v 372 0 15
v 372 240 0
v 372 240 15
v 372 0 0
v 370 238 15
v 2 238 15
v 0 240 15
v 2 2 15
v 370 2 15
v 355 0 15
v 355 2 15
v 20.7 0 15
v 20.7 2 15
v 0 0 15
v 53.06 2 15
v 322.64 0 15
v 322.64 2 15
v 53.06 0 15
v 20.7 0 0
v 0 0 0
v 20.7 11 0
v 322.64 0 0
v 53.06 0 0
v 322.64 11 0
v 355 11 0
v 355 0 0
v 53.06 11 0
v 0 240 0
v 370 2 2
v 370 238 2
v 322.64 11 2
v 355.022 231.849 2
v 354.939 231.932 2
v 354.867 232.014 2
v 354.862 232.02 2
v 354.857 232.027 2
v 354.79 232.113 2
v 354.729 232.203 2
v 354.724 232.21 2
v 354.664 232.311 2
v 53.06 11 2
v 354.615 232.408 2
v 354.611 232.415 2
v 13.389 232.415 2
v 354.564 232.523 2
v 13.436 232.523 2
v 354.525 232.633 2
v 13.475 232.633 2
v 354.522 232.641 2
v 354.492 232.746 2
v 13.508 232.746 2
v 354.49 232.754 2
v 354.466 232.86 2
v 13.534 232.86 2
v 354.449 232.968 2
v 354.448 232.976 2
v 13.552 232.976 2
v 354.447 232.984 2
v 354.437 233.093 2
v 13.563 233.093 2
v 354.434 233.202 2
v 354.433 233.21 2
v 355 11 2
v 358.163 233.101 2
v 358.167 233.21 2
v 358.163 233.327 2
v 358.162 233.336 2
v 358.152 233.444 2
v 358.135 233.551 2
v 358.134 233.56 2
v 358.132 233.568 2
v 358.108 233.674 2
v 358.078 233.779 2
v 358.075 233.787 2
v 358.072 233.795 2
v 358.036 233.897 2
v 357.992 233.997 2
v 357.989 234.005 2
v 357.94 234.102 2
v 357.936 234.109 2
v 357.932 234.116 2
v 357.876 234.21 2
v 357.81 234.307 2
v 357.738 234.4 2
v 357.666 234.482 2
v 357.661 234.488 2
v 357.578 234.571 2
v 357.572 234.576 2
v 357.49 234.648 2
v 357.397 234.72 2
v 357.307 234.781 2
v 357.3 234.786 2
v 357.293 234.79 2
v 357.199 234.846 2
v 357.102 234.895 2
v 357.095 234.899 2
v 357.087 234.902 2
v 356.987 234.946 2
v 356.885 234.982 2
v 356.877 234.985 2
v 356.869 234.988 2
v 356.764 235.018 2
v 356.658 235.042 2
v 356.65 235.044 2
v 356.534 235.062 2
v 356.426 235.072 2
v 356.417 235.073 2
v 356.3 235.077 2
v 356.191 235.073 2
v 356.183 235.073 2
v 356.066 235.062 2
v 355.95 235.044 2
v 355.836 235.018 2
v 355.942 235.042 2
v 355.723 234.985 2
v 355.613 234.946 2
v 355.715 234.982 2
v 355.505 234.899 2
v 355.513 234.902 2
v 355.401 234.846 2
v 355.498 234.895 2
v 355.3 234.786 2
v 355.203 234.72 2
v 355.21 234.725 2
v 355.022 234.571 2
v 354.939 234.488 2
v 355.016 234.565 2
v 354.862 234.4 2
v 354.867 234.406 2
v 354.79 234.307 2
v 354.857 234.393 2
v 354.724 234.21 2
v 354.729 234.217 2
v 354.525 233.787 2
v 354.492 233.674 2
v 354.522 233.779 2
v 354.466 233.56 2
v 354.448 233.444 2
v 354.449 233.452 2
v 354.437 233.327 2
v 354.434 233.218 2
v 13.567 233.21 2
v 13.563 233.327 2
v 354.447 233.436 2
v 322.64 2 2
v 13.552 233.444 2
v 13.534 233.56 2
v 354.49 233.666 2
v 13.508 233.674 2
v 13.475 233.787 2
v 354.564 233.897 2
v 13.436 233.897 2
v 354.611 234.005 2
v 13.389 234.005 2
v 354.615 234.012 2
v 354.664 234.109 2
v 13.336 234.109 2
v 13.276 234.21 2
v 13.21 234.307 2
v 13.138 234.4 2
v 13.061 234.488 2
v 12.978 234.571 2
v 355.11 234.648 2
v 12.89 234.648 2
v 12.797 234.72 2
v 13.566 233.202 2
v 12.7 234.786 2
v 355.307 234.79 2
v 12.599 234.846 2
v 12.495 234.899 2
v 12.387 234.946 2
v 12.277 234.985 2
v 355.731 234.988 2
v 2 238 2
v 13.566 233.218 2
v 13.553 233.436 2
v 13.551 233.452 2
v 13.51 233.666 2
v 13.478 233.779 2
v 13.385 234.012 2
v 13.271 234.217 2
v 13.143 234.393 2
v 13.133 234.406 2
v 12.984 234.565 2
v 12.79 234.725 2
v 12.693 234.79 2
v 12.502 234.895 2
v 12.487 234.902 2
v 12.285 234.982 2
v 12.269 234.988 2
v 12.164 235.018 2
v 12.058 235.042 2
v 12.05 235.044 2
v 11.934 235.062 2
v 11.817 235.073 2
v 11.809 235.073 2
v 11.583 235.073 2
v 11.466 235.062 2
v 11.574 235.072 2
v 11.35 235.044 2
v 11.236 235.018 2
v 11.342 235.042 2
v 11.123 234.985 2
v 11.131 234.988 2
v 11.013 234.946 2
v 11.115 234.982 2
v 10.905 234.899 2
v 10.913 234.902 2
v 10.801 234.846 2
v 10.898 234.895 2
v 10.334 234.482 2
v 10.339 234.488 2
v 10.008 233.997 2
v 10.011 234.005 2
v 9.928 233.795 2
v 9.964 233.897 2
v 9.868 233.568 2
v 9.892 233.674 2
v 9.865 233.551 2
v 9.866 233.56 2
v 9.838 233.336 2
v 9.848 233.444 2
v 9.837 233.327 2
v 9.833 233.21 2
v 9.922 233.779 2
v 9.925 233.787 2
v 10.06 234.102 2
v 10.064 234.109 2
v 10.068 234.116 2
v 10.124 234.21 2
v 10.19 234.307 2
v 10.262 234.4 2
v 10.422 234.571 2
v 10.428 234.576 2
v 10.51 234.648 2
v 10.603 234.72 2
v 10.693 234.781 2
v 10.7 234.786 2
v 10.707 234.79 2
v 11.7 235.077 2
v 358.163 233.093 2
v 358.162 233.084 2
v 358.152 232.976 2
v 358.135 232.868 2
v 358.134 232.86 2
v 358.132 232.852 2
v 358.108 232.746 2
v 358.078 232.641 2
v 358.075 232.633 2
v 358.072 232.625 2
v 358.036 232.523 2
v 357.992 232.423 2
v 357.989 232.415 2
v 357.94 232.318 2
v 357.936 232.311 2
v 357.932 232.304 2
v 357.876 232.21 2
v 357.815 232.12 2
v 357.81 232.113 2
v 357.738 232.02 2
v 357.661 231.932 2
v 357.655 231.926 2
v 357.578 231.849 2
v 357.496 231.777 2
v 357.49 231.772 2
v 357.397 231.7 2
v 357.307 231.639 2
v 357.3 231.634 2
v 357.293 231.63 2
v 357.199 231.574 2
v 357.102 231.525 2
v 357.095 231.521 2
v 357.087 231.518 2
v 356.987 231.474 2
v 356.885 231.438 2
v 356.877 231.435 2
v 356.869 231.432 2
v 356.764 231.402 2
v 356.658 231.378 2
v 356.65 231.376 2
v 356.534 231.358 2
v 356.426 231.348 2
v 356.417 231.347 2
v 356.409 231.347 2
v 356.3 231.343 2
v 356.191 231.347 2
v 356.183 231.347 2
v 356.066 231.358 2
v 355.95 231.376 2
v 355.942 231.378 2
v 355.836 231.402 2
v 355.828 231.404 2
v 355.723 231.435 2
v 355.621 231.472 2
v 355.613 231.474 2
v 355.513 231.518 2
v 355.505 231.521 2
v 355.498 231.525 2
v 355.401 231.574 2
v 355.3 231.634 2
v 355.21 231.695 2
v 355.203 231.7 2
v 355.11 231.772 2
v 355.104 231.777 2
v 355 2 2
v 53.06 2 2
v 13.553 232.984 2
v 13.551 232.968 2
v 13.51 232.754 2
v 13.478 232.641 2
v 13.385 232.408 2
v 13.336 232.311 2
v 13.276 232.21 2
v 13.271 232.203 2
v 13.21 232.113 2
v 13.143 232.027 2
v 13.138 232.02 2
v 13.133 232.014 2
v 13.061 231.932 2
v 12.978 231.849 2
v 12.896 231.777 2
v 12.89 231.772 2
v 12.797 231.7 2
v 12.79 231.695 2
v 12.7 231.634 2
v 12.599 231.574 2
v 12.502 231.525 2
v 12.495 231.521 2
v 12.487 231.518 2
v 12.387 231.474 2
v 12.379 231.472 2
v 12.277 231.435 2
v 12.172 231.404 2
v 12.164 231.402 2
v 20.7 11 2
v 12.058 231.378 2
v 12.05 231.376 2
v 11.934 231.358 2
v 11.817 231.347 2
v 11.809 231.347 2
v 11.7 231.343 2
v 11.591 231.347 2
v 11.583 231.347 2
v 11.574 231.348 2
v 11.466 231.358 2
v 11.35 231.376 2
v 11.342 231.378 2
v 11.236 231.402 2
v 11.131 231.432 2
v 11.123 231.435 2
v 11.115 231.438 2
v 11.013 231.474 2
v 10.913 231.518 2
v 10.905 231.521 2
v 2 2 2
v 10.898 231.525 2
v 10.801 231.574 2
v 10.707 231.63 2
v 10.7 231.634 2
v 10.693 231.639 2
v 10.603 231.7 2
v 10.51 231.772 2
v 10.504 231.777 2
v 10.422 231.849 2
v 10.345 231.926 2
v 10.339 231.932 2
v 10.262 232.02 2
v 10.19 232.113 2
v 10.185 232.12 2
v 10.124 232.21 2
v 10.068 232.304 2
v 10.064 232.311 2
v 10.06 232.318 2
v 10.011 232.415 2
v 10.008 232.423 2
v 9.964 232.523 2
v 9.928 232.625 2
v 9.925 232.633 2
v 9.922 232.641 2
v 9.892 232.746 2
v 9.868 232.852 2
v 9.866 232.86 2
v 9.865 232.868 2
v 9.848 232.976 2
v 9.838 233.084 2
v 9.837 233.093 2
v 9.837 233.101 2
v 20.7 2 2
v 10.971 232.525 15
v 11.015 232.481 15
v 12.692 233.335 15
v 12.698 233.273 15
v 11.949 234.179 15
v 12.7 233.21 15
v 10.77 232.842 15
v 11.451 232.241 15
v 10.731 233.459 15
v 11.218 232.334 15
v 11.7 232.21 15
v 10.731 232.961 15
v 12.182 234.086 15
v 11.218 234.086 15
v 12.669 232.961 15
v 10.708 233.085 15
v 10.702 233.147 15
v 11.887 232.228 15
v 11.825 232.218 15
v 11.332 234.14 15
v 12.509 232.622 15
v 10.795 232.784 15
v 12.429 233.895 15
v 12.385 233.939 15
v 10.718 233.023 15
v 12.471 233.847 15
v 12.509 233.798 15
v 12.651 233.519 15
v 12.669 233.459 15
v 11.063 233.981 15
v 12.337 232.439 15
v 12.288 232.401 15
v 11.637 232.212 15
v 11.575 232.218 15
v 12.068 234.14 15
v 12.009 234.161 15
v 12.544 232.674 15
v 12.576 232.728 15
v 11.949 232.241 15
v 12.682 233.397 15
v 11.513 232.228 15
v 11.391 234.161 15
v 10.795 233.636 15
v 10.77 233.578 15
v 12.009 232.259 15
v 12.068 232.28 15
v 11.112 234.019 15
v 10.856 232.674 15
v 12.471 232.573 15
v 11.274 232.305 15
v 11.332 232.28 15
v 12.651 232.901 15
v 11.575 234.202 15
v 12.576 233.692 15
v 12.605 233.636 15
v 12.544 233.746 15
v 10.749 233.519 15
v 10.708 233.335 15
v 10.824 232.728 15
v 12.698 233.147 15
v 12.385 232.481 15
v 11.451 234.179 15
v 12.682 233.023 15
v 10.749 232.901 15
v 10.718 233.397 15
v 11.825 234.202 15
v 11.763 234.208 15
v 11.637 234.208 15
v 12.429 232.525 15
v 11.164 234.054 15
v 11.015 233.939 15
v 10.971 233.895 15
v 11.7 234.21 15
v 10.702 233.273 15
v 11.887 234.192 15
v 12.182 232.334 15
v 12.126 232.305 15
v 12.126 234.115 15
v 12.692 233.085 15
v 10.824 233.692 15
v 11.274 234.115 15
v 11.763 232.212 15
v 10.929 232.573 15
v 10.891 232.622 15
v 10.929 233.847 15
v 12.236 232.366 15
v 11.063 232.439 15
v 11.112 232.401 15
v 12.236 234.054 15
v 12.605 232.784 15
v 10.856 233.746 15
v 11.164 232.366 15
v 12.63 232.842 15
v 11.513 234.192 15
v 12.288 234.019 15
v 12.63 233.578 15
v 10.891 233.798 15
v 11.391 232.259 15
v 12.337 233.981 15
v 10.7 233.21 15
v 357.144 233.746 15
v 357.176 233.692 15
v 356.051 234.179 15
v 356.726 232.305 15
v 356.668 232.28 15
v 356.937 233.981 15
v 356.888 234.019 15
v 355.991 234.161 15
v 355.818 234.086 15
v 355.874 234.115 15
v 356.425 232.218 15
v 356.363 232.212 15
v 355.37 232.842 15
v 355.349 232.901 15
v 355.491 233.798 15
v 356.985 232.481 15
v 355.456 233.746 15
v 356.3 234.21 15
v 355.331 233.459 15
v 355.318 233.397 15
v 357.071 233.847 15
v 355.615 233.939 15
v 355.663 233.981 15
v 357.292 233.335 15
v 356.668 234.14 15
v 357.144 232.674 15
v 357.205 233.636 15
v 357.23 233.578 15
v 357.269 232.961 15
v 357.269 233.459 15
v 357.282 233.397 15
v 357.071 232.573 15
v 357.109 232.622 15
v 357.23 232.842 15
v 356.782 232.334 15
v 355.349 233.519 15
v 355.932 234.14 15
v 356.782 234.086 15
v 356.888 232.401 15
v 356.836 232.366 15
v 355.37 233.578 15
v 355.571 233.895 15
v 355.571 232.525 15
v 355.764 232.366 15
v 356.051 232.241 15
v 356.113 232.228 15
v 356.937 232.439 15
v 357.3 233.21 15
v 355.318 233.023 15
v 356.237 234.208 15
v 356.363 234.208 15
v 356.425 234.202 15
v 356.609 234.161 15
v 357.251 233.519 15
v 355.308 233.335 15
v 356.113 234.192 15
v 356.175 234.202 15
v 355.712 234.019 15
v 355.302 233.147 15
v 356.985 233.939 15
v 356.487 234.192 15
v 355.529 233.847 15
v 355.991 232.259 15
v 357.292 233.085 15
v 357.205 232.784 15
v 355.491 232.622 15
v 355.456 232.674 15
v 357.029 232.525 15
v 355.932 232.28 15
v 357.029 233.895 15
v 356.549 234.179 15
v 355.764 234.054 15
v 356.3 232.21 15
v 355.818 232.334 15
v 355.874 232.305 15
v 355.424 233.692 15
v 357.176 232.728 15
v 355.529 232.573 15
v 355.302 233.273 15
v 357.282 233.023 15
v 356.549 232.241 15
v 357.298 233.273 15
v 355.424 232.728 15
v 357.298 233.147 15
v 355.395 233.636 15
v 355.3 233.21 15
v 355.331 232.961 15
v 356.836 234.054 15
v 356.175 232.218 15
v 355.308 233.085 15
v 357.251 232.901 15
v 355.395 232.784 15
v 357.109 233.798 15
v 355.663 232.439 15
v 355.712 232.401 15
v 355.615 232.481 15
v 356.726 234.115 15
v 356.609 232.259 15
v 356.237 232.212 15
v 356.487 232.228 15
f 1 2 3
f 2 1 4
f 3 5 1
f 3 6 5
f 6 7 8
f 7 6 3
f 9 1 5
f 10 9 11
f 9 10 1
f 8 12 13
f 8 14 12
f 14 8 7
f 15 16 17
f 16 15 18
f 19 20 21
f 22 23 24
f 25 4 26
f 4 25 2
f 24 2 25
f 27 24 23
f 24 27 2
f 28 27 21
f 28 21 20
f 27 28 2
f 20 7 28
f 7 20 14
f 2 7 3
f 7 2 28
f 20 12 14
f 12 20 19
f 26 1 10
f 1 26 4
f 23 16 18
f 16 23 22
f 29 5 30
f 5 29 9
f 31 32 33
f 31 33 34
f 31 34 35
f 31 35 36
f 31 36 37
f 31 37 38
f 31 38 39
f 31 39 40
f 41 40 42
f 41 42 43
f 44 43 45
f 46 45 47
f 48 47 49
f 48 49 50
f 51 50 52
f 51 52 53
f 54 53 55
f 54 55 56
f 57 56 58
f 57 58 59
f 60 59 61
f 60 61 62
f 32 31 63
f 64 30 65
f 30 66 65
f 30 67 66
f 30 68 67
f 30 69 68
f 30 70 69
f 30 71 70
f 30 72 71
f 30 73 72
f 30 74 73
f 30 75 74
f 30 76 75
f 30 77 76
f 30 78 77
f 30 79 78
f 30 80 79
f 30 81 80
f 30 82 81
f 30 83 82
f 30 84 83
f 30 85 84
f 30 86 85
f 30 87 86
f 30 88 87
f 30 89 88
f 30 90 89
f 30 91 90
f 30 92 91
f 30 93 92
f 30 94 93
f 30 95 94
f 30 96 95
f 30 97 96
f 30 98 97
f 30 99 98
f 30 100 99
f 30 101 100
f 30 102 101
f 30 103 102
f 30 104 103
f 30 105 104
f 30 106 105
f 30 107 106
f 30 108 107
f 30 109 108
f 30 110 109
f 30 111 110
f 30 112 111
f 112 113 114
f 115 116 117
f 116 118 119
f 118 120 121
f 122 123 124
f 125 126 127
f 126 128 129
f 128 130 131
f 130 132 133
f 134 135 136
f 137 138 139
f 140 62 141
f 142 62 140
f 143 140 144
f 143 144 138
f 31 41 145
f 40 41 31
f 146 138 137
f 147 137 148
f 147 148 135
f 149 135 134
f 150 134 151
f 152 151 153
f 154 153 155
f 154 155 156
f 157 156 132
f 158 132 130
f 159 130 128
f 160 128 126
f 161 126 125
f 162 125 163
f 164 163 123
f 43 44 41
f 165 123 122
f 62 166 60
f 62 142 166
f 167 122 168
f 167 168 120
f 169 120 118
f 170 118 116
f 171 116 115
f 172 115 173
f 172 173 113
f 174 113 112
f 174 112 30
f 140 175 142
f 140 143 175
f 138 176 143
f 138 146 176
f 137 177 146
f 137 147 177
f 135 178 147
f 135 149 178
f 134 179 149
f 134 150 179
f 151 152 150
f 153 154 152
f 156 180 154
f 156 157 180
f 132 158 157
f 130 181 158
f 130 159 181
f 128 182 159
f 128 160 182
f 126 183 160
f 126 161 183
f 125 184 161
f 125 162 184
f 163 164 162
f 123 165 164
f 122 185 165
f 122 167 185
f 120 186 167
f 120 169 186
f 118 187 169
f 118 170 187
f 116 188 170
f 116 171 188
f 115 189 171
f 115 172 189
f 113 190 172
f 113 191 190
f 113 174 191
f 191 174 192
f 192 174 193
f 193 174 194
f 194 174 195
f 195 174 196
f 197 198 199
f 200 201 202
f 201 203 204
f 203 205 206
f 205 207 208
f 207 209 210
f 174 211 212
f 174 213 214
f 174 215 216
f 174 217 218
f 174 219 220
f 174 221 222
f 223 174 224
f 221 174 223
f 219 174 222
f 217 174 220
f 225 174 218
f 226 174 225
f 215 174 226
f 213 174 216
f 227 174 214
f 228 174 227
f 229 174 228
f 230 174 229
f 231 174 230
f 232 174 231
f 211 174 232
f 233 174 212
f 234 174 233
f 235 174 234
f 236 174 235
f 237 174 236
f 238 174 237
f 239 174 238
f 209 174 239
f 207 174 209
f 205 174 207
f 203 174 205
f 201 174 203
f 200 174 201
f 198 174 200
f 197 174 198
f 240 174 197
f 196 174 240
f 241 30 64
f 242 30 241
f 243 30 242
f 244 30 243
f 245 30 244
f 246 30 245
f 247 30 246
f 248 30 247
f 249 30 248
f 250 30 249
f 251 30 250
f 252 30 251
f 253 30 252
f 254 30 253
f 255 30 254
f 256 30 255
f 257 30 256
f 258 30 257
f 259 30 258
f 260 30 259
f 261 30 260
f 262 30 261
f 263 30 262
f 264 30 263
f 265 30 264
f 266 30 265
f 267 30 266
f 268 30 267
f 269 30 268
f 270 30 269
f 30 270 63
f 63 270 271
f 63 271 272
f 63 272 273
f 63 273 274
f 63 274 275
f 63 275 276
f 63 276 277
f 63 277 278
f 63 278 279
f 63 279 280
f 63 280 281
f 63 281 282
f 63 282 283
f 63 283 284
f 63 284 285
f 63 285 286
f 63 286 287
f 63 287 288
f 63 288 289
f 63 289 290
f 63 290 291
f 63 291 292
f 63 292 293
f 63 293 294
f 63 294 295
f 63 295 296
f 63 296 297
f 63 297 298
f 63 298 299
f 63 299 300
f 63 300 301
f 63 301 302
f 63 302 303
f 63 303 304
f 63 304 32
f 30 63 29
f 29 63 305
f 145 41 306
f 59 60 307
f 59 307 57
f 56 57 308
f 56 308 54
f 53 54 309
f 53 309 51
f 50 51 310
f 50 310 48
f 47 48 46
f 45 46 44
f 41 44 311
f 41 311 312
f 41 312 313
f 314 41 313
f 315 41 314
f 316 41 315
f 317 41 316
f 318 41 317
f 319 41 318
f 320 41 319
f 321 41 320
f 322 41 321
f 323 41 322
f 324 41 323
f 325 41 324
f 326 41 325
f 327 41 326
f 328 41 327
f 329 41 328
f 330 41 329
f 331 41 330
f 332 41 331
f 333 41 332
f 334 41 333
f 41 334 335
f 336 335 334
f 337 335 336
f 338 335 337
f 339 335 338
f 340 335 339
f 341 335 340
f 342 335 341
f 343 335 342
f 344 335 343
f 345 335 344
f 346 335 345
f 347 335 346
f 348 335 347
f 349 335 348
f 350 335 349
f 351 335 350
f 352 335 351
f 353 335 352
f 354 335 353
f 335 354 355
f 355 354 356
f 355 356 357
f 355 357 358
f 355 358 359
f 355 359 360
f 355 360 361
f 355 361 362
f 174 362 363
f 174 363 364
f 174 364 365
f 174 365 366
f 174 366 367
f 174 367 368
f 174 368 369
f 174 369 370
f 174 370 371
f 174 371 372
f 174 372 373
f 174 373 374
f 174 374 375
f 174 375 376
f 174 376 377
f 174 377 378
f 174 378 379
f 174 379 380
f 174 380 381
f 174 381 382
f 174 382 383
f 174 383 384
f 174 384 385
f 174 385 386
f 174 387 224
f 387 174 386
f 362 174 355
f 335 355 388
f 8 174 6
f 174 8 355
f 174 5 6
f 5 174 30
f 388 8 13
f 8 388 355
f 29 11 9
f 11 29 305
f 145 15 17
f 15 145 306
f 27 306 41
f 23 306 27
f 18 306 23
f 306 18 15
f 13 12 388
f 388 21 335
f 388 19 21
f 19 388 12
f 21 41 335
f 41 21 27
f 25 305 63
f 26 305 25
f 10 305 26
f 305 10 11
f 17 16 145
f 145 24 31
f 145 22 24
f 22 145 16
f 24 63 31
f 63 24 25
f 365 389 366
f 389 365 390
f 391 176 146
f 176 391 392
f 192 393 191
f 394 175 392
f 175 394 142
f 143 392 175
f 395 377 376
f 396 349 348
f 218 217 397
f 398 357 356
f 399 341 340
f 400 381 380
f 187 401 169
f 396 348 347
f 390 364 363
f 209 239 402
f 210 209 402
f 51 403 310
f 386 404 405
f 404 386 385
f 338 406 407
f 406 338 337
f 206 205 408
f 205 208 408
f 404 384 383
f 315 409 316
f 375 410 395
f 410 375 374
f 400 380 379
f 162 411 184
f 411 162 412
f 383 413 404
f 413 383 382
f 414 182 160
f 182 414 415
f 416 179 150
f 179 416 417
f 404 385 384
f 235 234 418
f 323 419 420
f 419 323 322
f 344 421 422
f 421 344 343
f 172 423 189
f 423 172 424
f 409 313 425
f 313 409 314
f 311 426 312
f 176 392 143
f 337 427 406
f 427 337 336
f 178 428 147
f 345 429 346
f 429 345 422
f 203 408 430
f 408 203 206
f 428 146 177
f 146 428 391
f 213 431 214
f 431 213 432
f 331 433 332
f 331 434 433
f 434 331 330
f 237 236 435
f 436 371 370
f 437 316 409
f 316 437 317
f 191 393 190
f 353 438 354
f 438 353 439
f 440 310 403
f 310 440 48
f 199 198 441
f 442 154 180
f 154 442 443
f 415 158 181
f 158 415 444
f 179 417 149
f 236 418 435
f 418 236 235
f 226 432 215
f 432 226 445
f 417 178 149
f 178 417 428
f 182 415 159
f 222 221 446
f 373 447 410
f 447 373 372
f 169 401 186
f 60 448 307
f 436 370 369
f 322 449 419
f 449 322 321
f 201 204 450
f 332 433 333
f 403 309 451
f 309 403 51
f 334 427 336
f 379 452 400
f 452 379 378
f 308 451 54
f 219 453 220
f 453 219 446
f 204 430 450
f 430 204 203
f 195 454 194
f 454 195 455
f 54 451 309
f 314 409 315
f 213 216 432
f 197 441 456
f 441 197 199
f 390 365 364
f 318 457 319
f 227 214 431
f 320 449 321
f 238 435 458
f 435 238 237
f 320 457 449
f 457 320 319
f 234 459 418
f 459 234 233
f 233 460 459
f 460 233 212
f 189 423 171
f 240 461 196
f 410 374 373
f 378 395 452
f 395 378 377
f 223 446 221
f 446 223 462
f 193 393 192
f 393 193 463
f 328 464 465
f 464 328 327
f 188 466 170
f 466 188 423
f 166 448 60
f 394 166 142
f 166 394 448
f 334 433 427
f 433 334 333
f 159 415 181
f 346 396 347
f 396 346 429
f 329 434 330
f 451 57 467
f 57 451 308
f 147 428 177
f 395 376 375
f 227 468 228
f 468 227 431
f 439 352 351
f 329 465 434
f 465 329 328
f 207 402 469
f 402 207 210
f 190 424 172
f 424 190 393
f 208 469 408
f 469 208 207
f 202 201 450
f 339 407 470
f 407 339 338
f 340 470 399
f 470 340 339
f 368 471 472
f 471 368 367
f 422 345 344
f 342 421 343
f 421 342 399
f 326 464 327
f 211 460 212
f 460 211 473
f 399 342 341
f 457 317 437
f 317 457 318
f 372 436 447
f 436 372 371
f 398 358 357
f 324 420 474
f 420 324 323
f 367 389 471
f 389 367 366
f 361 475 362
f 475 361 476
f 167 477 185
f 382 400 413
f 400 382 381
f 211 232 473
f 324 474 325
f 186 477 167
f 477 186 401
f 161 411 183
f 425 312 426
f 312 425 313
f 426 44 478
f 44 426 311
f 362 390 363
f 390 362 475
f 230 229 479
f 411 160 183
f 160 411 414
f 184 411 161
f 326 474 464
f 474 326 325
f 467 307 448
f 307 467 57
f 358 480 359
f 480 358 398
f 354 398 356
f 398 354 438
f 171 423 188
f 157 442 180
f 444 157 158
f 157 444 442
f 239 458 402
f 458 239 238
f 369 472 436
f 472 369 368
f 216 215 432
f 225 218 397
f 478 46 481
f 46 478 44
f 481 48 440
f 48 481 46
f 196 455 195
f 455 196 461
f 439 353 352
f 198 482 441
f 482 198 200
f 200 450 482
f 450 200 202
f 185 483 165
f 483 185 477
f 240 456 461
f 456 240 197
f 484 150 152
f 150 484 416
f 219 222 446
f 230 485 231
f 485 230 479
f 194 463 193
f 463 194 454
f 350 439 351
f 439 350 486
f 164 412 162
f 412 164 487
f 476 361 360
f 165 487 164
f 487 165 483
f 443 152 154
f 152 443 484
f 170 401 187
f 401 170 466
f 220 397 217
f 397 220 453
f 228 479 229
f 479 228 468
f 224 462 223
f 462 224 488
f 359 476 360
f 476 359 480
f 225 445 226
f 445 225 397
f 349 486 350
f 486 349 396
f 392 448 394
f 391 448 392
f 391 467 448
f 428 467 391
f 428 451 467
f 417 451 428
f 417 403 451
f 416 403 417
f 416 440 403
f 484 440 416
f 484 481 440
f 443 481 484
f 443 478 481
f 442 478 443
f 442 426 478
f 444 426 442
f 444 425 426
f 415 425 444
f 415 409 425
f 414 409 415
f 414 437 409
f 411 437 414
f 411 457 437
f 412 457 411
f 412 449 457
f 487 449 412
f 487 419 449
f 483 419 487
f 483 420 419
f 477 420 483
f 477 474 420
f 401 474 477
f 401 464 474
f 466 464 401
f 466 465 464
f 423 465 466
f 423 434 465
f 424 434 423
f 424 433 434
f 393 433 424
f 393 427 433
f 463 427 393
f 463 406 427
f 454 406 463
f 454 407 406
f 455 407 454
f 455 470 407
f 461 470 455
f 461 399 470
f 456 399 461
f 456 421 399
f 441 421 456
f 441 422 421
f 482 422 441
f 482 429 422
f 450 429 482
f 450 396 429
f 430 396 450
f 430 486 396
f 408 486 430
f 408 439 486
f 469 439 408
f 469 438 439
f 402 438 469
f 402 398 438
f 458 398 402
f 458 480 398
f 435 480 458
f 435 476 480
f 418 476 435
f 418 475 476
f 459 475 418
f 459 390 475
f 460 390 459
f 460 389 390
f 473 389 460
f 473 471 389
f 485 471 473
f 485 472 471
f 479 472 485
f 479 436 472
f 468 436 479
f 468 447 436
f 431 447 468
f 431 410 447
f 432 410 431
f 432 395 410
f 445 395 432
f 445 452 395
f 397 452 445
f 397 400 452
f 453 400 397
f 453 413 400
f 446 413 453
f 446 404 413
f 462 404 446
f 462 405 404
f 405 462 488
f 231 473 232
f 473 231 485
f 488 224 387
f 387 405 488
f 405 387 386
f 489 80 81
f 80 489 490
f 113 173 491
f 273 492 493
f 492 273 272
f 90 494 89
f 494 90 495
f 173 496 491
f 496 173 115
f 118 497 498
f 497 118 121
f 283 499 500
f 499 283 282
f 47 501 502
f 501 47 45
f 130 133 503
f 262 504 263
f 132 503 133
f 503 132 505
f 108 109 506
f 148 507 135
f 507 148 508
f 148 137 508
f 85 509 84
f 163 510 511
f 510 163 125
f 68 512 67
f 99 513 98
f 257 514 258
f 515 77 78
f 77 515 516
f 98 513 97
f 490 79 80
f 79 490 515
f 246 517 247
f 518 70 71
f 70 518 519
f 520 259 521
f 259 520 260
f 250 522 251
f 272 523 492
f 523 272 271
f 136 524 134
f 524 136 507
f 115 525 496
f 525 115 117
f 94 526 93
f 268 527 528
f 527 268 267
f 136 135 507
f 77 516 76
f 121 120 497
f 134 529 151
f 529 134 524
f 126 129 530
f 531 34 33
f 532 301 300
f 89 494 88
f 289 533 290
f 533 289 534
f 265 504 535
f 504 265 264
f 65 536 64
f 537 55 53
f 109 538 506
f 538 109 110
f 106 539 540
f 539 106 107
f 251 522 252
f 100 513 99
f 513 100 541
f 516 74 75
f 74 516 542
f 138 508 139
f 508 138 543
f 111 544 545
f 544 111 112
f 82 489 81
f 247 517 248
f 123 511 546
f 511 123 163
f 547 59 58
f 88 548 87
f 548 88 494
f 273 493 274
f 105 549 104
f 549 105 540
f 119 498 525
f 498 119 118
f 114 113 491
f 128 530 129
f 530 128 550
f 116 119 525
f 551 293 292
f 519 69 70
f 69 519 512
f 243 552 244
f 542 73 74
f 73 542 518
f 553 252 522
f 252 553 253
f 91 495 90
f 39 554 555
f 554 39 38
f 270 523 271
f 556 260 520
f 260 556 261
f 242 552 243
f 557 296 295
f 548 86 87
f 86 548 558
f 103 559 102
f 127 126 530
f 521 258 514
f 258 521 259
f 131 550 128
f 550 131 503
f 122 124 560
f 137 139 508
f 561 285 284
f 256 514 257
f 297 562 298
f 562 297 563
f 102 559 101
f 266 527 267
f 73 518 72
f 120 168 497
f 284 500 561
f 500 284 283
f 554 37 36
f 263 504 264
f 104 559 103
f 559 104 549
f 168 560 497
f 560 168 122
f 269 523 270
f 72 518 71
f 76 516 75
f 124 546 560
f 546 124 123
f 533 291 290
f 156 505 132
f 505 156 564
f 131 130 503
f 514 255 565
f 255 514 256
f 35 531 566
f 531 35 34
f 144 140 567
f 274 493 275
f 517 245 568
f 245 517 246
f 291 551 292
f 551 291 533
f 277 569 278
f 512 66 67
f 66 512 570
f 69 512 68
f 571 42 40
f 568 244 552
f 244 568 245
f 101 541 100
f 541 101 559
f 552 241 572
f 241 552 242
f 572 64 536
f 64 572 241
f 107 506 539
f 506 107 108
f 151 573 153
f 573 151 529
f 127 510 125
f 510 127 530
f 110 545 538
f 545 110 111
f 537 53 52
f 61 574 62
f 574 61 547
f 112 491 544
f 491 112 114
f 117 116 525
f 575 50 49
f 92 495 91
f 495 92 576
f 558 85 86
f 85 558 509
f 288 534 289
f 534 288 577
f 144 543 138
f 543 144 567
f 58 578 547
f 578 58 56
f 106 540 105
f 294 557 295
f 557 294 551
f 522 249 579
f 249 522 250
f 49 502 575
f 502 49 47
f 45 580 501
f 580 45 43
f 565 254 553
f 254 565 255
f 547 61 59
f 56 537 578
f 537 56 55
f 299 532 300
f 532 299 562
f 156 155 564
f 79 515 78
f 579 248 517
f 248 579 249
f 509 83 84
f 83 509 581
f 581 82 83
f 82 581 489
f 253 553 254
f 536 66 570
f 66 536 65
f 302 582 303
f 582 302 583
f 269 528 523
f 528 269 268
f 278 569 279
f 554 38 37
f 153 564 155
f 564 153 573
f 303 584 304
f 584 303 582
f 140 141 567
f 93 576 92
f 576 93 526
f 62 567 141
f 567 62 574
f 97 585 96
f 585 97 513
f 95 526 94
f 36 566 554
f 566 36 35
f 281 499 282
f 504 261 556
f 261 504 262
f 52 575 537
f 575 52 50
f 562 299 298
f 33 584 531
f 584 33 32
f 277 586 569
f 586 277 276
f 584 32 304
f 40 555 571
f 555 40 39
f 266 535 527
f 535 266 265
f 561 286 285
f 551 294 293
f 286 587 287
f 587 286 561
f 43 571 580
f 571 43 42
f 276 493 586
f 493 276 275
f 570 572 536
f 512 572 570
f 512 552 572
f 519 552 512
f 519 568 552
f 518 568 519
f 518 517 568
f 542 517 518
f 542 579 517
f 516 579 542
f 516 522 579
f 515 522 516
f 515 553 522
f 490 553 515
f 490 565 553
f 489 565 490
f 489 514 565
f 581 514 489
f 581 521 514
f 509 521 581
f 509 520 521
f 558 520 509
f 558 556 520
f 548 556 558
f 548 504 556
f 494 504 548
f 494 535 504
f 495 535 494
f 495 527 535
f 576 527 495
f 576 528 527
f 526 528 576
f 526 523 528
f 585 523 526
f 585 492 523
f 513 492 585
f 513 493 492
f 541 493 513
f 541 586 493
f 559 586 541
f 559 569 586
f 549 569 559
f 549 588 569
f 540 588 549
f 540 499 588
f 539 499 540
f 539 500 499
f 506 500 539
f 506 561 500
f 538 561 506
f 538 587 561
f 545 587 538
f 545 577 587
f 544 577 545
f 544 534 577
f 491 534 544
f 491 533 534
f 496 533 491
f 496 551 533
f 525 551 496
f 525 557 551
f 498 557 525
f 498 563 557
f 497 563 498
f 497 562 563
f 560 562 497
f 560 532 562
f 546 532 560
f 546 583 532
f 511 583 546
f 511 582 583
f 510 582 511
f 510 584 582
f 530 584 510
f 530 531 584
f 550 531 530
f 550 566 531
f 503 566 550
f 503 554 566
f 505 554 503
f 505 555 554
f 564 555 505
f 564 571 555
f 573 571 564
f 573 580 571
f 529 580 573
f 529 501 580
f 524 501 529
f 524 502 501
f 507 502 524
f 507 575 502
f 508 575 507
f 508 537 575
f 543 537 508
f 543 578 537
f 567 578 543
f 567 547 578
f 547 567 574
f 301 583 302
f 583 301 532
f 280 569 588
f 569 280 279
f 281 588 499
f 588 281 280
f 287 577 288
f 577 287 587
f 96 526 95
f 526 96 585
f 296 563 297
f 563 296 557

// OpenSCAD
dimensions=[372, 240, 15];

//X-offset only
cutout_dist=20.7;
cutout_dimensions=[32.36, 11, dimensions[2]];

difference(){
    cube(dimensions);
    translate([2, 2, 2])cube([dimensions[0] - 4, dimensions[1] - 4, dimensions[2]-2]);
    
    //Cutouts
    translate([cutout_dist, 0, 0])cube(cutout_dimensions);
    translate([322.64, 0, 0])cube(cutout_dimensions);
}

post_dist = [11.7, dimensions[1] - 6.79, 0];


//Post1
translate(post_dist)cylinder(dimensions[2], 2, $fn=100);

//Move Post2 to other side of display
post_dist2 = [dimensions[0] - 4 - post_dist[0], post_dist[1], post_dist[2]];
translate(post_dist2)cylinder(dimensions[2], 2, $fn=100);
